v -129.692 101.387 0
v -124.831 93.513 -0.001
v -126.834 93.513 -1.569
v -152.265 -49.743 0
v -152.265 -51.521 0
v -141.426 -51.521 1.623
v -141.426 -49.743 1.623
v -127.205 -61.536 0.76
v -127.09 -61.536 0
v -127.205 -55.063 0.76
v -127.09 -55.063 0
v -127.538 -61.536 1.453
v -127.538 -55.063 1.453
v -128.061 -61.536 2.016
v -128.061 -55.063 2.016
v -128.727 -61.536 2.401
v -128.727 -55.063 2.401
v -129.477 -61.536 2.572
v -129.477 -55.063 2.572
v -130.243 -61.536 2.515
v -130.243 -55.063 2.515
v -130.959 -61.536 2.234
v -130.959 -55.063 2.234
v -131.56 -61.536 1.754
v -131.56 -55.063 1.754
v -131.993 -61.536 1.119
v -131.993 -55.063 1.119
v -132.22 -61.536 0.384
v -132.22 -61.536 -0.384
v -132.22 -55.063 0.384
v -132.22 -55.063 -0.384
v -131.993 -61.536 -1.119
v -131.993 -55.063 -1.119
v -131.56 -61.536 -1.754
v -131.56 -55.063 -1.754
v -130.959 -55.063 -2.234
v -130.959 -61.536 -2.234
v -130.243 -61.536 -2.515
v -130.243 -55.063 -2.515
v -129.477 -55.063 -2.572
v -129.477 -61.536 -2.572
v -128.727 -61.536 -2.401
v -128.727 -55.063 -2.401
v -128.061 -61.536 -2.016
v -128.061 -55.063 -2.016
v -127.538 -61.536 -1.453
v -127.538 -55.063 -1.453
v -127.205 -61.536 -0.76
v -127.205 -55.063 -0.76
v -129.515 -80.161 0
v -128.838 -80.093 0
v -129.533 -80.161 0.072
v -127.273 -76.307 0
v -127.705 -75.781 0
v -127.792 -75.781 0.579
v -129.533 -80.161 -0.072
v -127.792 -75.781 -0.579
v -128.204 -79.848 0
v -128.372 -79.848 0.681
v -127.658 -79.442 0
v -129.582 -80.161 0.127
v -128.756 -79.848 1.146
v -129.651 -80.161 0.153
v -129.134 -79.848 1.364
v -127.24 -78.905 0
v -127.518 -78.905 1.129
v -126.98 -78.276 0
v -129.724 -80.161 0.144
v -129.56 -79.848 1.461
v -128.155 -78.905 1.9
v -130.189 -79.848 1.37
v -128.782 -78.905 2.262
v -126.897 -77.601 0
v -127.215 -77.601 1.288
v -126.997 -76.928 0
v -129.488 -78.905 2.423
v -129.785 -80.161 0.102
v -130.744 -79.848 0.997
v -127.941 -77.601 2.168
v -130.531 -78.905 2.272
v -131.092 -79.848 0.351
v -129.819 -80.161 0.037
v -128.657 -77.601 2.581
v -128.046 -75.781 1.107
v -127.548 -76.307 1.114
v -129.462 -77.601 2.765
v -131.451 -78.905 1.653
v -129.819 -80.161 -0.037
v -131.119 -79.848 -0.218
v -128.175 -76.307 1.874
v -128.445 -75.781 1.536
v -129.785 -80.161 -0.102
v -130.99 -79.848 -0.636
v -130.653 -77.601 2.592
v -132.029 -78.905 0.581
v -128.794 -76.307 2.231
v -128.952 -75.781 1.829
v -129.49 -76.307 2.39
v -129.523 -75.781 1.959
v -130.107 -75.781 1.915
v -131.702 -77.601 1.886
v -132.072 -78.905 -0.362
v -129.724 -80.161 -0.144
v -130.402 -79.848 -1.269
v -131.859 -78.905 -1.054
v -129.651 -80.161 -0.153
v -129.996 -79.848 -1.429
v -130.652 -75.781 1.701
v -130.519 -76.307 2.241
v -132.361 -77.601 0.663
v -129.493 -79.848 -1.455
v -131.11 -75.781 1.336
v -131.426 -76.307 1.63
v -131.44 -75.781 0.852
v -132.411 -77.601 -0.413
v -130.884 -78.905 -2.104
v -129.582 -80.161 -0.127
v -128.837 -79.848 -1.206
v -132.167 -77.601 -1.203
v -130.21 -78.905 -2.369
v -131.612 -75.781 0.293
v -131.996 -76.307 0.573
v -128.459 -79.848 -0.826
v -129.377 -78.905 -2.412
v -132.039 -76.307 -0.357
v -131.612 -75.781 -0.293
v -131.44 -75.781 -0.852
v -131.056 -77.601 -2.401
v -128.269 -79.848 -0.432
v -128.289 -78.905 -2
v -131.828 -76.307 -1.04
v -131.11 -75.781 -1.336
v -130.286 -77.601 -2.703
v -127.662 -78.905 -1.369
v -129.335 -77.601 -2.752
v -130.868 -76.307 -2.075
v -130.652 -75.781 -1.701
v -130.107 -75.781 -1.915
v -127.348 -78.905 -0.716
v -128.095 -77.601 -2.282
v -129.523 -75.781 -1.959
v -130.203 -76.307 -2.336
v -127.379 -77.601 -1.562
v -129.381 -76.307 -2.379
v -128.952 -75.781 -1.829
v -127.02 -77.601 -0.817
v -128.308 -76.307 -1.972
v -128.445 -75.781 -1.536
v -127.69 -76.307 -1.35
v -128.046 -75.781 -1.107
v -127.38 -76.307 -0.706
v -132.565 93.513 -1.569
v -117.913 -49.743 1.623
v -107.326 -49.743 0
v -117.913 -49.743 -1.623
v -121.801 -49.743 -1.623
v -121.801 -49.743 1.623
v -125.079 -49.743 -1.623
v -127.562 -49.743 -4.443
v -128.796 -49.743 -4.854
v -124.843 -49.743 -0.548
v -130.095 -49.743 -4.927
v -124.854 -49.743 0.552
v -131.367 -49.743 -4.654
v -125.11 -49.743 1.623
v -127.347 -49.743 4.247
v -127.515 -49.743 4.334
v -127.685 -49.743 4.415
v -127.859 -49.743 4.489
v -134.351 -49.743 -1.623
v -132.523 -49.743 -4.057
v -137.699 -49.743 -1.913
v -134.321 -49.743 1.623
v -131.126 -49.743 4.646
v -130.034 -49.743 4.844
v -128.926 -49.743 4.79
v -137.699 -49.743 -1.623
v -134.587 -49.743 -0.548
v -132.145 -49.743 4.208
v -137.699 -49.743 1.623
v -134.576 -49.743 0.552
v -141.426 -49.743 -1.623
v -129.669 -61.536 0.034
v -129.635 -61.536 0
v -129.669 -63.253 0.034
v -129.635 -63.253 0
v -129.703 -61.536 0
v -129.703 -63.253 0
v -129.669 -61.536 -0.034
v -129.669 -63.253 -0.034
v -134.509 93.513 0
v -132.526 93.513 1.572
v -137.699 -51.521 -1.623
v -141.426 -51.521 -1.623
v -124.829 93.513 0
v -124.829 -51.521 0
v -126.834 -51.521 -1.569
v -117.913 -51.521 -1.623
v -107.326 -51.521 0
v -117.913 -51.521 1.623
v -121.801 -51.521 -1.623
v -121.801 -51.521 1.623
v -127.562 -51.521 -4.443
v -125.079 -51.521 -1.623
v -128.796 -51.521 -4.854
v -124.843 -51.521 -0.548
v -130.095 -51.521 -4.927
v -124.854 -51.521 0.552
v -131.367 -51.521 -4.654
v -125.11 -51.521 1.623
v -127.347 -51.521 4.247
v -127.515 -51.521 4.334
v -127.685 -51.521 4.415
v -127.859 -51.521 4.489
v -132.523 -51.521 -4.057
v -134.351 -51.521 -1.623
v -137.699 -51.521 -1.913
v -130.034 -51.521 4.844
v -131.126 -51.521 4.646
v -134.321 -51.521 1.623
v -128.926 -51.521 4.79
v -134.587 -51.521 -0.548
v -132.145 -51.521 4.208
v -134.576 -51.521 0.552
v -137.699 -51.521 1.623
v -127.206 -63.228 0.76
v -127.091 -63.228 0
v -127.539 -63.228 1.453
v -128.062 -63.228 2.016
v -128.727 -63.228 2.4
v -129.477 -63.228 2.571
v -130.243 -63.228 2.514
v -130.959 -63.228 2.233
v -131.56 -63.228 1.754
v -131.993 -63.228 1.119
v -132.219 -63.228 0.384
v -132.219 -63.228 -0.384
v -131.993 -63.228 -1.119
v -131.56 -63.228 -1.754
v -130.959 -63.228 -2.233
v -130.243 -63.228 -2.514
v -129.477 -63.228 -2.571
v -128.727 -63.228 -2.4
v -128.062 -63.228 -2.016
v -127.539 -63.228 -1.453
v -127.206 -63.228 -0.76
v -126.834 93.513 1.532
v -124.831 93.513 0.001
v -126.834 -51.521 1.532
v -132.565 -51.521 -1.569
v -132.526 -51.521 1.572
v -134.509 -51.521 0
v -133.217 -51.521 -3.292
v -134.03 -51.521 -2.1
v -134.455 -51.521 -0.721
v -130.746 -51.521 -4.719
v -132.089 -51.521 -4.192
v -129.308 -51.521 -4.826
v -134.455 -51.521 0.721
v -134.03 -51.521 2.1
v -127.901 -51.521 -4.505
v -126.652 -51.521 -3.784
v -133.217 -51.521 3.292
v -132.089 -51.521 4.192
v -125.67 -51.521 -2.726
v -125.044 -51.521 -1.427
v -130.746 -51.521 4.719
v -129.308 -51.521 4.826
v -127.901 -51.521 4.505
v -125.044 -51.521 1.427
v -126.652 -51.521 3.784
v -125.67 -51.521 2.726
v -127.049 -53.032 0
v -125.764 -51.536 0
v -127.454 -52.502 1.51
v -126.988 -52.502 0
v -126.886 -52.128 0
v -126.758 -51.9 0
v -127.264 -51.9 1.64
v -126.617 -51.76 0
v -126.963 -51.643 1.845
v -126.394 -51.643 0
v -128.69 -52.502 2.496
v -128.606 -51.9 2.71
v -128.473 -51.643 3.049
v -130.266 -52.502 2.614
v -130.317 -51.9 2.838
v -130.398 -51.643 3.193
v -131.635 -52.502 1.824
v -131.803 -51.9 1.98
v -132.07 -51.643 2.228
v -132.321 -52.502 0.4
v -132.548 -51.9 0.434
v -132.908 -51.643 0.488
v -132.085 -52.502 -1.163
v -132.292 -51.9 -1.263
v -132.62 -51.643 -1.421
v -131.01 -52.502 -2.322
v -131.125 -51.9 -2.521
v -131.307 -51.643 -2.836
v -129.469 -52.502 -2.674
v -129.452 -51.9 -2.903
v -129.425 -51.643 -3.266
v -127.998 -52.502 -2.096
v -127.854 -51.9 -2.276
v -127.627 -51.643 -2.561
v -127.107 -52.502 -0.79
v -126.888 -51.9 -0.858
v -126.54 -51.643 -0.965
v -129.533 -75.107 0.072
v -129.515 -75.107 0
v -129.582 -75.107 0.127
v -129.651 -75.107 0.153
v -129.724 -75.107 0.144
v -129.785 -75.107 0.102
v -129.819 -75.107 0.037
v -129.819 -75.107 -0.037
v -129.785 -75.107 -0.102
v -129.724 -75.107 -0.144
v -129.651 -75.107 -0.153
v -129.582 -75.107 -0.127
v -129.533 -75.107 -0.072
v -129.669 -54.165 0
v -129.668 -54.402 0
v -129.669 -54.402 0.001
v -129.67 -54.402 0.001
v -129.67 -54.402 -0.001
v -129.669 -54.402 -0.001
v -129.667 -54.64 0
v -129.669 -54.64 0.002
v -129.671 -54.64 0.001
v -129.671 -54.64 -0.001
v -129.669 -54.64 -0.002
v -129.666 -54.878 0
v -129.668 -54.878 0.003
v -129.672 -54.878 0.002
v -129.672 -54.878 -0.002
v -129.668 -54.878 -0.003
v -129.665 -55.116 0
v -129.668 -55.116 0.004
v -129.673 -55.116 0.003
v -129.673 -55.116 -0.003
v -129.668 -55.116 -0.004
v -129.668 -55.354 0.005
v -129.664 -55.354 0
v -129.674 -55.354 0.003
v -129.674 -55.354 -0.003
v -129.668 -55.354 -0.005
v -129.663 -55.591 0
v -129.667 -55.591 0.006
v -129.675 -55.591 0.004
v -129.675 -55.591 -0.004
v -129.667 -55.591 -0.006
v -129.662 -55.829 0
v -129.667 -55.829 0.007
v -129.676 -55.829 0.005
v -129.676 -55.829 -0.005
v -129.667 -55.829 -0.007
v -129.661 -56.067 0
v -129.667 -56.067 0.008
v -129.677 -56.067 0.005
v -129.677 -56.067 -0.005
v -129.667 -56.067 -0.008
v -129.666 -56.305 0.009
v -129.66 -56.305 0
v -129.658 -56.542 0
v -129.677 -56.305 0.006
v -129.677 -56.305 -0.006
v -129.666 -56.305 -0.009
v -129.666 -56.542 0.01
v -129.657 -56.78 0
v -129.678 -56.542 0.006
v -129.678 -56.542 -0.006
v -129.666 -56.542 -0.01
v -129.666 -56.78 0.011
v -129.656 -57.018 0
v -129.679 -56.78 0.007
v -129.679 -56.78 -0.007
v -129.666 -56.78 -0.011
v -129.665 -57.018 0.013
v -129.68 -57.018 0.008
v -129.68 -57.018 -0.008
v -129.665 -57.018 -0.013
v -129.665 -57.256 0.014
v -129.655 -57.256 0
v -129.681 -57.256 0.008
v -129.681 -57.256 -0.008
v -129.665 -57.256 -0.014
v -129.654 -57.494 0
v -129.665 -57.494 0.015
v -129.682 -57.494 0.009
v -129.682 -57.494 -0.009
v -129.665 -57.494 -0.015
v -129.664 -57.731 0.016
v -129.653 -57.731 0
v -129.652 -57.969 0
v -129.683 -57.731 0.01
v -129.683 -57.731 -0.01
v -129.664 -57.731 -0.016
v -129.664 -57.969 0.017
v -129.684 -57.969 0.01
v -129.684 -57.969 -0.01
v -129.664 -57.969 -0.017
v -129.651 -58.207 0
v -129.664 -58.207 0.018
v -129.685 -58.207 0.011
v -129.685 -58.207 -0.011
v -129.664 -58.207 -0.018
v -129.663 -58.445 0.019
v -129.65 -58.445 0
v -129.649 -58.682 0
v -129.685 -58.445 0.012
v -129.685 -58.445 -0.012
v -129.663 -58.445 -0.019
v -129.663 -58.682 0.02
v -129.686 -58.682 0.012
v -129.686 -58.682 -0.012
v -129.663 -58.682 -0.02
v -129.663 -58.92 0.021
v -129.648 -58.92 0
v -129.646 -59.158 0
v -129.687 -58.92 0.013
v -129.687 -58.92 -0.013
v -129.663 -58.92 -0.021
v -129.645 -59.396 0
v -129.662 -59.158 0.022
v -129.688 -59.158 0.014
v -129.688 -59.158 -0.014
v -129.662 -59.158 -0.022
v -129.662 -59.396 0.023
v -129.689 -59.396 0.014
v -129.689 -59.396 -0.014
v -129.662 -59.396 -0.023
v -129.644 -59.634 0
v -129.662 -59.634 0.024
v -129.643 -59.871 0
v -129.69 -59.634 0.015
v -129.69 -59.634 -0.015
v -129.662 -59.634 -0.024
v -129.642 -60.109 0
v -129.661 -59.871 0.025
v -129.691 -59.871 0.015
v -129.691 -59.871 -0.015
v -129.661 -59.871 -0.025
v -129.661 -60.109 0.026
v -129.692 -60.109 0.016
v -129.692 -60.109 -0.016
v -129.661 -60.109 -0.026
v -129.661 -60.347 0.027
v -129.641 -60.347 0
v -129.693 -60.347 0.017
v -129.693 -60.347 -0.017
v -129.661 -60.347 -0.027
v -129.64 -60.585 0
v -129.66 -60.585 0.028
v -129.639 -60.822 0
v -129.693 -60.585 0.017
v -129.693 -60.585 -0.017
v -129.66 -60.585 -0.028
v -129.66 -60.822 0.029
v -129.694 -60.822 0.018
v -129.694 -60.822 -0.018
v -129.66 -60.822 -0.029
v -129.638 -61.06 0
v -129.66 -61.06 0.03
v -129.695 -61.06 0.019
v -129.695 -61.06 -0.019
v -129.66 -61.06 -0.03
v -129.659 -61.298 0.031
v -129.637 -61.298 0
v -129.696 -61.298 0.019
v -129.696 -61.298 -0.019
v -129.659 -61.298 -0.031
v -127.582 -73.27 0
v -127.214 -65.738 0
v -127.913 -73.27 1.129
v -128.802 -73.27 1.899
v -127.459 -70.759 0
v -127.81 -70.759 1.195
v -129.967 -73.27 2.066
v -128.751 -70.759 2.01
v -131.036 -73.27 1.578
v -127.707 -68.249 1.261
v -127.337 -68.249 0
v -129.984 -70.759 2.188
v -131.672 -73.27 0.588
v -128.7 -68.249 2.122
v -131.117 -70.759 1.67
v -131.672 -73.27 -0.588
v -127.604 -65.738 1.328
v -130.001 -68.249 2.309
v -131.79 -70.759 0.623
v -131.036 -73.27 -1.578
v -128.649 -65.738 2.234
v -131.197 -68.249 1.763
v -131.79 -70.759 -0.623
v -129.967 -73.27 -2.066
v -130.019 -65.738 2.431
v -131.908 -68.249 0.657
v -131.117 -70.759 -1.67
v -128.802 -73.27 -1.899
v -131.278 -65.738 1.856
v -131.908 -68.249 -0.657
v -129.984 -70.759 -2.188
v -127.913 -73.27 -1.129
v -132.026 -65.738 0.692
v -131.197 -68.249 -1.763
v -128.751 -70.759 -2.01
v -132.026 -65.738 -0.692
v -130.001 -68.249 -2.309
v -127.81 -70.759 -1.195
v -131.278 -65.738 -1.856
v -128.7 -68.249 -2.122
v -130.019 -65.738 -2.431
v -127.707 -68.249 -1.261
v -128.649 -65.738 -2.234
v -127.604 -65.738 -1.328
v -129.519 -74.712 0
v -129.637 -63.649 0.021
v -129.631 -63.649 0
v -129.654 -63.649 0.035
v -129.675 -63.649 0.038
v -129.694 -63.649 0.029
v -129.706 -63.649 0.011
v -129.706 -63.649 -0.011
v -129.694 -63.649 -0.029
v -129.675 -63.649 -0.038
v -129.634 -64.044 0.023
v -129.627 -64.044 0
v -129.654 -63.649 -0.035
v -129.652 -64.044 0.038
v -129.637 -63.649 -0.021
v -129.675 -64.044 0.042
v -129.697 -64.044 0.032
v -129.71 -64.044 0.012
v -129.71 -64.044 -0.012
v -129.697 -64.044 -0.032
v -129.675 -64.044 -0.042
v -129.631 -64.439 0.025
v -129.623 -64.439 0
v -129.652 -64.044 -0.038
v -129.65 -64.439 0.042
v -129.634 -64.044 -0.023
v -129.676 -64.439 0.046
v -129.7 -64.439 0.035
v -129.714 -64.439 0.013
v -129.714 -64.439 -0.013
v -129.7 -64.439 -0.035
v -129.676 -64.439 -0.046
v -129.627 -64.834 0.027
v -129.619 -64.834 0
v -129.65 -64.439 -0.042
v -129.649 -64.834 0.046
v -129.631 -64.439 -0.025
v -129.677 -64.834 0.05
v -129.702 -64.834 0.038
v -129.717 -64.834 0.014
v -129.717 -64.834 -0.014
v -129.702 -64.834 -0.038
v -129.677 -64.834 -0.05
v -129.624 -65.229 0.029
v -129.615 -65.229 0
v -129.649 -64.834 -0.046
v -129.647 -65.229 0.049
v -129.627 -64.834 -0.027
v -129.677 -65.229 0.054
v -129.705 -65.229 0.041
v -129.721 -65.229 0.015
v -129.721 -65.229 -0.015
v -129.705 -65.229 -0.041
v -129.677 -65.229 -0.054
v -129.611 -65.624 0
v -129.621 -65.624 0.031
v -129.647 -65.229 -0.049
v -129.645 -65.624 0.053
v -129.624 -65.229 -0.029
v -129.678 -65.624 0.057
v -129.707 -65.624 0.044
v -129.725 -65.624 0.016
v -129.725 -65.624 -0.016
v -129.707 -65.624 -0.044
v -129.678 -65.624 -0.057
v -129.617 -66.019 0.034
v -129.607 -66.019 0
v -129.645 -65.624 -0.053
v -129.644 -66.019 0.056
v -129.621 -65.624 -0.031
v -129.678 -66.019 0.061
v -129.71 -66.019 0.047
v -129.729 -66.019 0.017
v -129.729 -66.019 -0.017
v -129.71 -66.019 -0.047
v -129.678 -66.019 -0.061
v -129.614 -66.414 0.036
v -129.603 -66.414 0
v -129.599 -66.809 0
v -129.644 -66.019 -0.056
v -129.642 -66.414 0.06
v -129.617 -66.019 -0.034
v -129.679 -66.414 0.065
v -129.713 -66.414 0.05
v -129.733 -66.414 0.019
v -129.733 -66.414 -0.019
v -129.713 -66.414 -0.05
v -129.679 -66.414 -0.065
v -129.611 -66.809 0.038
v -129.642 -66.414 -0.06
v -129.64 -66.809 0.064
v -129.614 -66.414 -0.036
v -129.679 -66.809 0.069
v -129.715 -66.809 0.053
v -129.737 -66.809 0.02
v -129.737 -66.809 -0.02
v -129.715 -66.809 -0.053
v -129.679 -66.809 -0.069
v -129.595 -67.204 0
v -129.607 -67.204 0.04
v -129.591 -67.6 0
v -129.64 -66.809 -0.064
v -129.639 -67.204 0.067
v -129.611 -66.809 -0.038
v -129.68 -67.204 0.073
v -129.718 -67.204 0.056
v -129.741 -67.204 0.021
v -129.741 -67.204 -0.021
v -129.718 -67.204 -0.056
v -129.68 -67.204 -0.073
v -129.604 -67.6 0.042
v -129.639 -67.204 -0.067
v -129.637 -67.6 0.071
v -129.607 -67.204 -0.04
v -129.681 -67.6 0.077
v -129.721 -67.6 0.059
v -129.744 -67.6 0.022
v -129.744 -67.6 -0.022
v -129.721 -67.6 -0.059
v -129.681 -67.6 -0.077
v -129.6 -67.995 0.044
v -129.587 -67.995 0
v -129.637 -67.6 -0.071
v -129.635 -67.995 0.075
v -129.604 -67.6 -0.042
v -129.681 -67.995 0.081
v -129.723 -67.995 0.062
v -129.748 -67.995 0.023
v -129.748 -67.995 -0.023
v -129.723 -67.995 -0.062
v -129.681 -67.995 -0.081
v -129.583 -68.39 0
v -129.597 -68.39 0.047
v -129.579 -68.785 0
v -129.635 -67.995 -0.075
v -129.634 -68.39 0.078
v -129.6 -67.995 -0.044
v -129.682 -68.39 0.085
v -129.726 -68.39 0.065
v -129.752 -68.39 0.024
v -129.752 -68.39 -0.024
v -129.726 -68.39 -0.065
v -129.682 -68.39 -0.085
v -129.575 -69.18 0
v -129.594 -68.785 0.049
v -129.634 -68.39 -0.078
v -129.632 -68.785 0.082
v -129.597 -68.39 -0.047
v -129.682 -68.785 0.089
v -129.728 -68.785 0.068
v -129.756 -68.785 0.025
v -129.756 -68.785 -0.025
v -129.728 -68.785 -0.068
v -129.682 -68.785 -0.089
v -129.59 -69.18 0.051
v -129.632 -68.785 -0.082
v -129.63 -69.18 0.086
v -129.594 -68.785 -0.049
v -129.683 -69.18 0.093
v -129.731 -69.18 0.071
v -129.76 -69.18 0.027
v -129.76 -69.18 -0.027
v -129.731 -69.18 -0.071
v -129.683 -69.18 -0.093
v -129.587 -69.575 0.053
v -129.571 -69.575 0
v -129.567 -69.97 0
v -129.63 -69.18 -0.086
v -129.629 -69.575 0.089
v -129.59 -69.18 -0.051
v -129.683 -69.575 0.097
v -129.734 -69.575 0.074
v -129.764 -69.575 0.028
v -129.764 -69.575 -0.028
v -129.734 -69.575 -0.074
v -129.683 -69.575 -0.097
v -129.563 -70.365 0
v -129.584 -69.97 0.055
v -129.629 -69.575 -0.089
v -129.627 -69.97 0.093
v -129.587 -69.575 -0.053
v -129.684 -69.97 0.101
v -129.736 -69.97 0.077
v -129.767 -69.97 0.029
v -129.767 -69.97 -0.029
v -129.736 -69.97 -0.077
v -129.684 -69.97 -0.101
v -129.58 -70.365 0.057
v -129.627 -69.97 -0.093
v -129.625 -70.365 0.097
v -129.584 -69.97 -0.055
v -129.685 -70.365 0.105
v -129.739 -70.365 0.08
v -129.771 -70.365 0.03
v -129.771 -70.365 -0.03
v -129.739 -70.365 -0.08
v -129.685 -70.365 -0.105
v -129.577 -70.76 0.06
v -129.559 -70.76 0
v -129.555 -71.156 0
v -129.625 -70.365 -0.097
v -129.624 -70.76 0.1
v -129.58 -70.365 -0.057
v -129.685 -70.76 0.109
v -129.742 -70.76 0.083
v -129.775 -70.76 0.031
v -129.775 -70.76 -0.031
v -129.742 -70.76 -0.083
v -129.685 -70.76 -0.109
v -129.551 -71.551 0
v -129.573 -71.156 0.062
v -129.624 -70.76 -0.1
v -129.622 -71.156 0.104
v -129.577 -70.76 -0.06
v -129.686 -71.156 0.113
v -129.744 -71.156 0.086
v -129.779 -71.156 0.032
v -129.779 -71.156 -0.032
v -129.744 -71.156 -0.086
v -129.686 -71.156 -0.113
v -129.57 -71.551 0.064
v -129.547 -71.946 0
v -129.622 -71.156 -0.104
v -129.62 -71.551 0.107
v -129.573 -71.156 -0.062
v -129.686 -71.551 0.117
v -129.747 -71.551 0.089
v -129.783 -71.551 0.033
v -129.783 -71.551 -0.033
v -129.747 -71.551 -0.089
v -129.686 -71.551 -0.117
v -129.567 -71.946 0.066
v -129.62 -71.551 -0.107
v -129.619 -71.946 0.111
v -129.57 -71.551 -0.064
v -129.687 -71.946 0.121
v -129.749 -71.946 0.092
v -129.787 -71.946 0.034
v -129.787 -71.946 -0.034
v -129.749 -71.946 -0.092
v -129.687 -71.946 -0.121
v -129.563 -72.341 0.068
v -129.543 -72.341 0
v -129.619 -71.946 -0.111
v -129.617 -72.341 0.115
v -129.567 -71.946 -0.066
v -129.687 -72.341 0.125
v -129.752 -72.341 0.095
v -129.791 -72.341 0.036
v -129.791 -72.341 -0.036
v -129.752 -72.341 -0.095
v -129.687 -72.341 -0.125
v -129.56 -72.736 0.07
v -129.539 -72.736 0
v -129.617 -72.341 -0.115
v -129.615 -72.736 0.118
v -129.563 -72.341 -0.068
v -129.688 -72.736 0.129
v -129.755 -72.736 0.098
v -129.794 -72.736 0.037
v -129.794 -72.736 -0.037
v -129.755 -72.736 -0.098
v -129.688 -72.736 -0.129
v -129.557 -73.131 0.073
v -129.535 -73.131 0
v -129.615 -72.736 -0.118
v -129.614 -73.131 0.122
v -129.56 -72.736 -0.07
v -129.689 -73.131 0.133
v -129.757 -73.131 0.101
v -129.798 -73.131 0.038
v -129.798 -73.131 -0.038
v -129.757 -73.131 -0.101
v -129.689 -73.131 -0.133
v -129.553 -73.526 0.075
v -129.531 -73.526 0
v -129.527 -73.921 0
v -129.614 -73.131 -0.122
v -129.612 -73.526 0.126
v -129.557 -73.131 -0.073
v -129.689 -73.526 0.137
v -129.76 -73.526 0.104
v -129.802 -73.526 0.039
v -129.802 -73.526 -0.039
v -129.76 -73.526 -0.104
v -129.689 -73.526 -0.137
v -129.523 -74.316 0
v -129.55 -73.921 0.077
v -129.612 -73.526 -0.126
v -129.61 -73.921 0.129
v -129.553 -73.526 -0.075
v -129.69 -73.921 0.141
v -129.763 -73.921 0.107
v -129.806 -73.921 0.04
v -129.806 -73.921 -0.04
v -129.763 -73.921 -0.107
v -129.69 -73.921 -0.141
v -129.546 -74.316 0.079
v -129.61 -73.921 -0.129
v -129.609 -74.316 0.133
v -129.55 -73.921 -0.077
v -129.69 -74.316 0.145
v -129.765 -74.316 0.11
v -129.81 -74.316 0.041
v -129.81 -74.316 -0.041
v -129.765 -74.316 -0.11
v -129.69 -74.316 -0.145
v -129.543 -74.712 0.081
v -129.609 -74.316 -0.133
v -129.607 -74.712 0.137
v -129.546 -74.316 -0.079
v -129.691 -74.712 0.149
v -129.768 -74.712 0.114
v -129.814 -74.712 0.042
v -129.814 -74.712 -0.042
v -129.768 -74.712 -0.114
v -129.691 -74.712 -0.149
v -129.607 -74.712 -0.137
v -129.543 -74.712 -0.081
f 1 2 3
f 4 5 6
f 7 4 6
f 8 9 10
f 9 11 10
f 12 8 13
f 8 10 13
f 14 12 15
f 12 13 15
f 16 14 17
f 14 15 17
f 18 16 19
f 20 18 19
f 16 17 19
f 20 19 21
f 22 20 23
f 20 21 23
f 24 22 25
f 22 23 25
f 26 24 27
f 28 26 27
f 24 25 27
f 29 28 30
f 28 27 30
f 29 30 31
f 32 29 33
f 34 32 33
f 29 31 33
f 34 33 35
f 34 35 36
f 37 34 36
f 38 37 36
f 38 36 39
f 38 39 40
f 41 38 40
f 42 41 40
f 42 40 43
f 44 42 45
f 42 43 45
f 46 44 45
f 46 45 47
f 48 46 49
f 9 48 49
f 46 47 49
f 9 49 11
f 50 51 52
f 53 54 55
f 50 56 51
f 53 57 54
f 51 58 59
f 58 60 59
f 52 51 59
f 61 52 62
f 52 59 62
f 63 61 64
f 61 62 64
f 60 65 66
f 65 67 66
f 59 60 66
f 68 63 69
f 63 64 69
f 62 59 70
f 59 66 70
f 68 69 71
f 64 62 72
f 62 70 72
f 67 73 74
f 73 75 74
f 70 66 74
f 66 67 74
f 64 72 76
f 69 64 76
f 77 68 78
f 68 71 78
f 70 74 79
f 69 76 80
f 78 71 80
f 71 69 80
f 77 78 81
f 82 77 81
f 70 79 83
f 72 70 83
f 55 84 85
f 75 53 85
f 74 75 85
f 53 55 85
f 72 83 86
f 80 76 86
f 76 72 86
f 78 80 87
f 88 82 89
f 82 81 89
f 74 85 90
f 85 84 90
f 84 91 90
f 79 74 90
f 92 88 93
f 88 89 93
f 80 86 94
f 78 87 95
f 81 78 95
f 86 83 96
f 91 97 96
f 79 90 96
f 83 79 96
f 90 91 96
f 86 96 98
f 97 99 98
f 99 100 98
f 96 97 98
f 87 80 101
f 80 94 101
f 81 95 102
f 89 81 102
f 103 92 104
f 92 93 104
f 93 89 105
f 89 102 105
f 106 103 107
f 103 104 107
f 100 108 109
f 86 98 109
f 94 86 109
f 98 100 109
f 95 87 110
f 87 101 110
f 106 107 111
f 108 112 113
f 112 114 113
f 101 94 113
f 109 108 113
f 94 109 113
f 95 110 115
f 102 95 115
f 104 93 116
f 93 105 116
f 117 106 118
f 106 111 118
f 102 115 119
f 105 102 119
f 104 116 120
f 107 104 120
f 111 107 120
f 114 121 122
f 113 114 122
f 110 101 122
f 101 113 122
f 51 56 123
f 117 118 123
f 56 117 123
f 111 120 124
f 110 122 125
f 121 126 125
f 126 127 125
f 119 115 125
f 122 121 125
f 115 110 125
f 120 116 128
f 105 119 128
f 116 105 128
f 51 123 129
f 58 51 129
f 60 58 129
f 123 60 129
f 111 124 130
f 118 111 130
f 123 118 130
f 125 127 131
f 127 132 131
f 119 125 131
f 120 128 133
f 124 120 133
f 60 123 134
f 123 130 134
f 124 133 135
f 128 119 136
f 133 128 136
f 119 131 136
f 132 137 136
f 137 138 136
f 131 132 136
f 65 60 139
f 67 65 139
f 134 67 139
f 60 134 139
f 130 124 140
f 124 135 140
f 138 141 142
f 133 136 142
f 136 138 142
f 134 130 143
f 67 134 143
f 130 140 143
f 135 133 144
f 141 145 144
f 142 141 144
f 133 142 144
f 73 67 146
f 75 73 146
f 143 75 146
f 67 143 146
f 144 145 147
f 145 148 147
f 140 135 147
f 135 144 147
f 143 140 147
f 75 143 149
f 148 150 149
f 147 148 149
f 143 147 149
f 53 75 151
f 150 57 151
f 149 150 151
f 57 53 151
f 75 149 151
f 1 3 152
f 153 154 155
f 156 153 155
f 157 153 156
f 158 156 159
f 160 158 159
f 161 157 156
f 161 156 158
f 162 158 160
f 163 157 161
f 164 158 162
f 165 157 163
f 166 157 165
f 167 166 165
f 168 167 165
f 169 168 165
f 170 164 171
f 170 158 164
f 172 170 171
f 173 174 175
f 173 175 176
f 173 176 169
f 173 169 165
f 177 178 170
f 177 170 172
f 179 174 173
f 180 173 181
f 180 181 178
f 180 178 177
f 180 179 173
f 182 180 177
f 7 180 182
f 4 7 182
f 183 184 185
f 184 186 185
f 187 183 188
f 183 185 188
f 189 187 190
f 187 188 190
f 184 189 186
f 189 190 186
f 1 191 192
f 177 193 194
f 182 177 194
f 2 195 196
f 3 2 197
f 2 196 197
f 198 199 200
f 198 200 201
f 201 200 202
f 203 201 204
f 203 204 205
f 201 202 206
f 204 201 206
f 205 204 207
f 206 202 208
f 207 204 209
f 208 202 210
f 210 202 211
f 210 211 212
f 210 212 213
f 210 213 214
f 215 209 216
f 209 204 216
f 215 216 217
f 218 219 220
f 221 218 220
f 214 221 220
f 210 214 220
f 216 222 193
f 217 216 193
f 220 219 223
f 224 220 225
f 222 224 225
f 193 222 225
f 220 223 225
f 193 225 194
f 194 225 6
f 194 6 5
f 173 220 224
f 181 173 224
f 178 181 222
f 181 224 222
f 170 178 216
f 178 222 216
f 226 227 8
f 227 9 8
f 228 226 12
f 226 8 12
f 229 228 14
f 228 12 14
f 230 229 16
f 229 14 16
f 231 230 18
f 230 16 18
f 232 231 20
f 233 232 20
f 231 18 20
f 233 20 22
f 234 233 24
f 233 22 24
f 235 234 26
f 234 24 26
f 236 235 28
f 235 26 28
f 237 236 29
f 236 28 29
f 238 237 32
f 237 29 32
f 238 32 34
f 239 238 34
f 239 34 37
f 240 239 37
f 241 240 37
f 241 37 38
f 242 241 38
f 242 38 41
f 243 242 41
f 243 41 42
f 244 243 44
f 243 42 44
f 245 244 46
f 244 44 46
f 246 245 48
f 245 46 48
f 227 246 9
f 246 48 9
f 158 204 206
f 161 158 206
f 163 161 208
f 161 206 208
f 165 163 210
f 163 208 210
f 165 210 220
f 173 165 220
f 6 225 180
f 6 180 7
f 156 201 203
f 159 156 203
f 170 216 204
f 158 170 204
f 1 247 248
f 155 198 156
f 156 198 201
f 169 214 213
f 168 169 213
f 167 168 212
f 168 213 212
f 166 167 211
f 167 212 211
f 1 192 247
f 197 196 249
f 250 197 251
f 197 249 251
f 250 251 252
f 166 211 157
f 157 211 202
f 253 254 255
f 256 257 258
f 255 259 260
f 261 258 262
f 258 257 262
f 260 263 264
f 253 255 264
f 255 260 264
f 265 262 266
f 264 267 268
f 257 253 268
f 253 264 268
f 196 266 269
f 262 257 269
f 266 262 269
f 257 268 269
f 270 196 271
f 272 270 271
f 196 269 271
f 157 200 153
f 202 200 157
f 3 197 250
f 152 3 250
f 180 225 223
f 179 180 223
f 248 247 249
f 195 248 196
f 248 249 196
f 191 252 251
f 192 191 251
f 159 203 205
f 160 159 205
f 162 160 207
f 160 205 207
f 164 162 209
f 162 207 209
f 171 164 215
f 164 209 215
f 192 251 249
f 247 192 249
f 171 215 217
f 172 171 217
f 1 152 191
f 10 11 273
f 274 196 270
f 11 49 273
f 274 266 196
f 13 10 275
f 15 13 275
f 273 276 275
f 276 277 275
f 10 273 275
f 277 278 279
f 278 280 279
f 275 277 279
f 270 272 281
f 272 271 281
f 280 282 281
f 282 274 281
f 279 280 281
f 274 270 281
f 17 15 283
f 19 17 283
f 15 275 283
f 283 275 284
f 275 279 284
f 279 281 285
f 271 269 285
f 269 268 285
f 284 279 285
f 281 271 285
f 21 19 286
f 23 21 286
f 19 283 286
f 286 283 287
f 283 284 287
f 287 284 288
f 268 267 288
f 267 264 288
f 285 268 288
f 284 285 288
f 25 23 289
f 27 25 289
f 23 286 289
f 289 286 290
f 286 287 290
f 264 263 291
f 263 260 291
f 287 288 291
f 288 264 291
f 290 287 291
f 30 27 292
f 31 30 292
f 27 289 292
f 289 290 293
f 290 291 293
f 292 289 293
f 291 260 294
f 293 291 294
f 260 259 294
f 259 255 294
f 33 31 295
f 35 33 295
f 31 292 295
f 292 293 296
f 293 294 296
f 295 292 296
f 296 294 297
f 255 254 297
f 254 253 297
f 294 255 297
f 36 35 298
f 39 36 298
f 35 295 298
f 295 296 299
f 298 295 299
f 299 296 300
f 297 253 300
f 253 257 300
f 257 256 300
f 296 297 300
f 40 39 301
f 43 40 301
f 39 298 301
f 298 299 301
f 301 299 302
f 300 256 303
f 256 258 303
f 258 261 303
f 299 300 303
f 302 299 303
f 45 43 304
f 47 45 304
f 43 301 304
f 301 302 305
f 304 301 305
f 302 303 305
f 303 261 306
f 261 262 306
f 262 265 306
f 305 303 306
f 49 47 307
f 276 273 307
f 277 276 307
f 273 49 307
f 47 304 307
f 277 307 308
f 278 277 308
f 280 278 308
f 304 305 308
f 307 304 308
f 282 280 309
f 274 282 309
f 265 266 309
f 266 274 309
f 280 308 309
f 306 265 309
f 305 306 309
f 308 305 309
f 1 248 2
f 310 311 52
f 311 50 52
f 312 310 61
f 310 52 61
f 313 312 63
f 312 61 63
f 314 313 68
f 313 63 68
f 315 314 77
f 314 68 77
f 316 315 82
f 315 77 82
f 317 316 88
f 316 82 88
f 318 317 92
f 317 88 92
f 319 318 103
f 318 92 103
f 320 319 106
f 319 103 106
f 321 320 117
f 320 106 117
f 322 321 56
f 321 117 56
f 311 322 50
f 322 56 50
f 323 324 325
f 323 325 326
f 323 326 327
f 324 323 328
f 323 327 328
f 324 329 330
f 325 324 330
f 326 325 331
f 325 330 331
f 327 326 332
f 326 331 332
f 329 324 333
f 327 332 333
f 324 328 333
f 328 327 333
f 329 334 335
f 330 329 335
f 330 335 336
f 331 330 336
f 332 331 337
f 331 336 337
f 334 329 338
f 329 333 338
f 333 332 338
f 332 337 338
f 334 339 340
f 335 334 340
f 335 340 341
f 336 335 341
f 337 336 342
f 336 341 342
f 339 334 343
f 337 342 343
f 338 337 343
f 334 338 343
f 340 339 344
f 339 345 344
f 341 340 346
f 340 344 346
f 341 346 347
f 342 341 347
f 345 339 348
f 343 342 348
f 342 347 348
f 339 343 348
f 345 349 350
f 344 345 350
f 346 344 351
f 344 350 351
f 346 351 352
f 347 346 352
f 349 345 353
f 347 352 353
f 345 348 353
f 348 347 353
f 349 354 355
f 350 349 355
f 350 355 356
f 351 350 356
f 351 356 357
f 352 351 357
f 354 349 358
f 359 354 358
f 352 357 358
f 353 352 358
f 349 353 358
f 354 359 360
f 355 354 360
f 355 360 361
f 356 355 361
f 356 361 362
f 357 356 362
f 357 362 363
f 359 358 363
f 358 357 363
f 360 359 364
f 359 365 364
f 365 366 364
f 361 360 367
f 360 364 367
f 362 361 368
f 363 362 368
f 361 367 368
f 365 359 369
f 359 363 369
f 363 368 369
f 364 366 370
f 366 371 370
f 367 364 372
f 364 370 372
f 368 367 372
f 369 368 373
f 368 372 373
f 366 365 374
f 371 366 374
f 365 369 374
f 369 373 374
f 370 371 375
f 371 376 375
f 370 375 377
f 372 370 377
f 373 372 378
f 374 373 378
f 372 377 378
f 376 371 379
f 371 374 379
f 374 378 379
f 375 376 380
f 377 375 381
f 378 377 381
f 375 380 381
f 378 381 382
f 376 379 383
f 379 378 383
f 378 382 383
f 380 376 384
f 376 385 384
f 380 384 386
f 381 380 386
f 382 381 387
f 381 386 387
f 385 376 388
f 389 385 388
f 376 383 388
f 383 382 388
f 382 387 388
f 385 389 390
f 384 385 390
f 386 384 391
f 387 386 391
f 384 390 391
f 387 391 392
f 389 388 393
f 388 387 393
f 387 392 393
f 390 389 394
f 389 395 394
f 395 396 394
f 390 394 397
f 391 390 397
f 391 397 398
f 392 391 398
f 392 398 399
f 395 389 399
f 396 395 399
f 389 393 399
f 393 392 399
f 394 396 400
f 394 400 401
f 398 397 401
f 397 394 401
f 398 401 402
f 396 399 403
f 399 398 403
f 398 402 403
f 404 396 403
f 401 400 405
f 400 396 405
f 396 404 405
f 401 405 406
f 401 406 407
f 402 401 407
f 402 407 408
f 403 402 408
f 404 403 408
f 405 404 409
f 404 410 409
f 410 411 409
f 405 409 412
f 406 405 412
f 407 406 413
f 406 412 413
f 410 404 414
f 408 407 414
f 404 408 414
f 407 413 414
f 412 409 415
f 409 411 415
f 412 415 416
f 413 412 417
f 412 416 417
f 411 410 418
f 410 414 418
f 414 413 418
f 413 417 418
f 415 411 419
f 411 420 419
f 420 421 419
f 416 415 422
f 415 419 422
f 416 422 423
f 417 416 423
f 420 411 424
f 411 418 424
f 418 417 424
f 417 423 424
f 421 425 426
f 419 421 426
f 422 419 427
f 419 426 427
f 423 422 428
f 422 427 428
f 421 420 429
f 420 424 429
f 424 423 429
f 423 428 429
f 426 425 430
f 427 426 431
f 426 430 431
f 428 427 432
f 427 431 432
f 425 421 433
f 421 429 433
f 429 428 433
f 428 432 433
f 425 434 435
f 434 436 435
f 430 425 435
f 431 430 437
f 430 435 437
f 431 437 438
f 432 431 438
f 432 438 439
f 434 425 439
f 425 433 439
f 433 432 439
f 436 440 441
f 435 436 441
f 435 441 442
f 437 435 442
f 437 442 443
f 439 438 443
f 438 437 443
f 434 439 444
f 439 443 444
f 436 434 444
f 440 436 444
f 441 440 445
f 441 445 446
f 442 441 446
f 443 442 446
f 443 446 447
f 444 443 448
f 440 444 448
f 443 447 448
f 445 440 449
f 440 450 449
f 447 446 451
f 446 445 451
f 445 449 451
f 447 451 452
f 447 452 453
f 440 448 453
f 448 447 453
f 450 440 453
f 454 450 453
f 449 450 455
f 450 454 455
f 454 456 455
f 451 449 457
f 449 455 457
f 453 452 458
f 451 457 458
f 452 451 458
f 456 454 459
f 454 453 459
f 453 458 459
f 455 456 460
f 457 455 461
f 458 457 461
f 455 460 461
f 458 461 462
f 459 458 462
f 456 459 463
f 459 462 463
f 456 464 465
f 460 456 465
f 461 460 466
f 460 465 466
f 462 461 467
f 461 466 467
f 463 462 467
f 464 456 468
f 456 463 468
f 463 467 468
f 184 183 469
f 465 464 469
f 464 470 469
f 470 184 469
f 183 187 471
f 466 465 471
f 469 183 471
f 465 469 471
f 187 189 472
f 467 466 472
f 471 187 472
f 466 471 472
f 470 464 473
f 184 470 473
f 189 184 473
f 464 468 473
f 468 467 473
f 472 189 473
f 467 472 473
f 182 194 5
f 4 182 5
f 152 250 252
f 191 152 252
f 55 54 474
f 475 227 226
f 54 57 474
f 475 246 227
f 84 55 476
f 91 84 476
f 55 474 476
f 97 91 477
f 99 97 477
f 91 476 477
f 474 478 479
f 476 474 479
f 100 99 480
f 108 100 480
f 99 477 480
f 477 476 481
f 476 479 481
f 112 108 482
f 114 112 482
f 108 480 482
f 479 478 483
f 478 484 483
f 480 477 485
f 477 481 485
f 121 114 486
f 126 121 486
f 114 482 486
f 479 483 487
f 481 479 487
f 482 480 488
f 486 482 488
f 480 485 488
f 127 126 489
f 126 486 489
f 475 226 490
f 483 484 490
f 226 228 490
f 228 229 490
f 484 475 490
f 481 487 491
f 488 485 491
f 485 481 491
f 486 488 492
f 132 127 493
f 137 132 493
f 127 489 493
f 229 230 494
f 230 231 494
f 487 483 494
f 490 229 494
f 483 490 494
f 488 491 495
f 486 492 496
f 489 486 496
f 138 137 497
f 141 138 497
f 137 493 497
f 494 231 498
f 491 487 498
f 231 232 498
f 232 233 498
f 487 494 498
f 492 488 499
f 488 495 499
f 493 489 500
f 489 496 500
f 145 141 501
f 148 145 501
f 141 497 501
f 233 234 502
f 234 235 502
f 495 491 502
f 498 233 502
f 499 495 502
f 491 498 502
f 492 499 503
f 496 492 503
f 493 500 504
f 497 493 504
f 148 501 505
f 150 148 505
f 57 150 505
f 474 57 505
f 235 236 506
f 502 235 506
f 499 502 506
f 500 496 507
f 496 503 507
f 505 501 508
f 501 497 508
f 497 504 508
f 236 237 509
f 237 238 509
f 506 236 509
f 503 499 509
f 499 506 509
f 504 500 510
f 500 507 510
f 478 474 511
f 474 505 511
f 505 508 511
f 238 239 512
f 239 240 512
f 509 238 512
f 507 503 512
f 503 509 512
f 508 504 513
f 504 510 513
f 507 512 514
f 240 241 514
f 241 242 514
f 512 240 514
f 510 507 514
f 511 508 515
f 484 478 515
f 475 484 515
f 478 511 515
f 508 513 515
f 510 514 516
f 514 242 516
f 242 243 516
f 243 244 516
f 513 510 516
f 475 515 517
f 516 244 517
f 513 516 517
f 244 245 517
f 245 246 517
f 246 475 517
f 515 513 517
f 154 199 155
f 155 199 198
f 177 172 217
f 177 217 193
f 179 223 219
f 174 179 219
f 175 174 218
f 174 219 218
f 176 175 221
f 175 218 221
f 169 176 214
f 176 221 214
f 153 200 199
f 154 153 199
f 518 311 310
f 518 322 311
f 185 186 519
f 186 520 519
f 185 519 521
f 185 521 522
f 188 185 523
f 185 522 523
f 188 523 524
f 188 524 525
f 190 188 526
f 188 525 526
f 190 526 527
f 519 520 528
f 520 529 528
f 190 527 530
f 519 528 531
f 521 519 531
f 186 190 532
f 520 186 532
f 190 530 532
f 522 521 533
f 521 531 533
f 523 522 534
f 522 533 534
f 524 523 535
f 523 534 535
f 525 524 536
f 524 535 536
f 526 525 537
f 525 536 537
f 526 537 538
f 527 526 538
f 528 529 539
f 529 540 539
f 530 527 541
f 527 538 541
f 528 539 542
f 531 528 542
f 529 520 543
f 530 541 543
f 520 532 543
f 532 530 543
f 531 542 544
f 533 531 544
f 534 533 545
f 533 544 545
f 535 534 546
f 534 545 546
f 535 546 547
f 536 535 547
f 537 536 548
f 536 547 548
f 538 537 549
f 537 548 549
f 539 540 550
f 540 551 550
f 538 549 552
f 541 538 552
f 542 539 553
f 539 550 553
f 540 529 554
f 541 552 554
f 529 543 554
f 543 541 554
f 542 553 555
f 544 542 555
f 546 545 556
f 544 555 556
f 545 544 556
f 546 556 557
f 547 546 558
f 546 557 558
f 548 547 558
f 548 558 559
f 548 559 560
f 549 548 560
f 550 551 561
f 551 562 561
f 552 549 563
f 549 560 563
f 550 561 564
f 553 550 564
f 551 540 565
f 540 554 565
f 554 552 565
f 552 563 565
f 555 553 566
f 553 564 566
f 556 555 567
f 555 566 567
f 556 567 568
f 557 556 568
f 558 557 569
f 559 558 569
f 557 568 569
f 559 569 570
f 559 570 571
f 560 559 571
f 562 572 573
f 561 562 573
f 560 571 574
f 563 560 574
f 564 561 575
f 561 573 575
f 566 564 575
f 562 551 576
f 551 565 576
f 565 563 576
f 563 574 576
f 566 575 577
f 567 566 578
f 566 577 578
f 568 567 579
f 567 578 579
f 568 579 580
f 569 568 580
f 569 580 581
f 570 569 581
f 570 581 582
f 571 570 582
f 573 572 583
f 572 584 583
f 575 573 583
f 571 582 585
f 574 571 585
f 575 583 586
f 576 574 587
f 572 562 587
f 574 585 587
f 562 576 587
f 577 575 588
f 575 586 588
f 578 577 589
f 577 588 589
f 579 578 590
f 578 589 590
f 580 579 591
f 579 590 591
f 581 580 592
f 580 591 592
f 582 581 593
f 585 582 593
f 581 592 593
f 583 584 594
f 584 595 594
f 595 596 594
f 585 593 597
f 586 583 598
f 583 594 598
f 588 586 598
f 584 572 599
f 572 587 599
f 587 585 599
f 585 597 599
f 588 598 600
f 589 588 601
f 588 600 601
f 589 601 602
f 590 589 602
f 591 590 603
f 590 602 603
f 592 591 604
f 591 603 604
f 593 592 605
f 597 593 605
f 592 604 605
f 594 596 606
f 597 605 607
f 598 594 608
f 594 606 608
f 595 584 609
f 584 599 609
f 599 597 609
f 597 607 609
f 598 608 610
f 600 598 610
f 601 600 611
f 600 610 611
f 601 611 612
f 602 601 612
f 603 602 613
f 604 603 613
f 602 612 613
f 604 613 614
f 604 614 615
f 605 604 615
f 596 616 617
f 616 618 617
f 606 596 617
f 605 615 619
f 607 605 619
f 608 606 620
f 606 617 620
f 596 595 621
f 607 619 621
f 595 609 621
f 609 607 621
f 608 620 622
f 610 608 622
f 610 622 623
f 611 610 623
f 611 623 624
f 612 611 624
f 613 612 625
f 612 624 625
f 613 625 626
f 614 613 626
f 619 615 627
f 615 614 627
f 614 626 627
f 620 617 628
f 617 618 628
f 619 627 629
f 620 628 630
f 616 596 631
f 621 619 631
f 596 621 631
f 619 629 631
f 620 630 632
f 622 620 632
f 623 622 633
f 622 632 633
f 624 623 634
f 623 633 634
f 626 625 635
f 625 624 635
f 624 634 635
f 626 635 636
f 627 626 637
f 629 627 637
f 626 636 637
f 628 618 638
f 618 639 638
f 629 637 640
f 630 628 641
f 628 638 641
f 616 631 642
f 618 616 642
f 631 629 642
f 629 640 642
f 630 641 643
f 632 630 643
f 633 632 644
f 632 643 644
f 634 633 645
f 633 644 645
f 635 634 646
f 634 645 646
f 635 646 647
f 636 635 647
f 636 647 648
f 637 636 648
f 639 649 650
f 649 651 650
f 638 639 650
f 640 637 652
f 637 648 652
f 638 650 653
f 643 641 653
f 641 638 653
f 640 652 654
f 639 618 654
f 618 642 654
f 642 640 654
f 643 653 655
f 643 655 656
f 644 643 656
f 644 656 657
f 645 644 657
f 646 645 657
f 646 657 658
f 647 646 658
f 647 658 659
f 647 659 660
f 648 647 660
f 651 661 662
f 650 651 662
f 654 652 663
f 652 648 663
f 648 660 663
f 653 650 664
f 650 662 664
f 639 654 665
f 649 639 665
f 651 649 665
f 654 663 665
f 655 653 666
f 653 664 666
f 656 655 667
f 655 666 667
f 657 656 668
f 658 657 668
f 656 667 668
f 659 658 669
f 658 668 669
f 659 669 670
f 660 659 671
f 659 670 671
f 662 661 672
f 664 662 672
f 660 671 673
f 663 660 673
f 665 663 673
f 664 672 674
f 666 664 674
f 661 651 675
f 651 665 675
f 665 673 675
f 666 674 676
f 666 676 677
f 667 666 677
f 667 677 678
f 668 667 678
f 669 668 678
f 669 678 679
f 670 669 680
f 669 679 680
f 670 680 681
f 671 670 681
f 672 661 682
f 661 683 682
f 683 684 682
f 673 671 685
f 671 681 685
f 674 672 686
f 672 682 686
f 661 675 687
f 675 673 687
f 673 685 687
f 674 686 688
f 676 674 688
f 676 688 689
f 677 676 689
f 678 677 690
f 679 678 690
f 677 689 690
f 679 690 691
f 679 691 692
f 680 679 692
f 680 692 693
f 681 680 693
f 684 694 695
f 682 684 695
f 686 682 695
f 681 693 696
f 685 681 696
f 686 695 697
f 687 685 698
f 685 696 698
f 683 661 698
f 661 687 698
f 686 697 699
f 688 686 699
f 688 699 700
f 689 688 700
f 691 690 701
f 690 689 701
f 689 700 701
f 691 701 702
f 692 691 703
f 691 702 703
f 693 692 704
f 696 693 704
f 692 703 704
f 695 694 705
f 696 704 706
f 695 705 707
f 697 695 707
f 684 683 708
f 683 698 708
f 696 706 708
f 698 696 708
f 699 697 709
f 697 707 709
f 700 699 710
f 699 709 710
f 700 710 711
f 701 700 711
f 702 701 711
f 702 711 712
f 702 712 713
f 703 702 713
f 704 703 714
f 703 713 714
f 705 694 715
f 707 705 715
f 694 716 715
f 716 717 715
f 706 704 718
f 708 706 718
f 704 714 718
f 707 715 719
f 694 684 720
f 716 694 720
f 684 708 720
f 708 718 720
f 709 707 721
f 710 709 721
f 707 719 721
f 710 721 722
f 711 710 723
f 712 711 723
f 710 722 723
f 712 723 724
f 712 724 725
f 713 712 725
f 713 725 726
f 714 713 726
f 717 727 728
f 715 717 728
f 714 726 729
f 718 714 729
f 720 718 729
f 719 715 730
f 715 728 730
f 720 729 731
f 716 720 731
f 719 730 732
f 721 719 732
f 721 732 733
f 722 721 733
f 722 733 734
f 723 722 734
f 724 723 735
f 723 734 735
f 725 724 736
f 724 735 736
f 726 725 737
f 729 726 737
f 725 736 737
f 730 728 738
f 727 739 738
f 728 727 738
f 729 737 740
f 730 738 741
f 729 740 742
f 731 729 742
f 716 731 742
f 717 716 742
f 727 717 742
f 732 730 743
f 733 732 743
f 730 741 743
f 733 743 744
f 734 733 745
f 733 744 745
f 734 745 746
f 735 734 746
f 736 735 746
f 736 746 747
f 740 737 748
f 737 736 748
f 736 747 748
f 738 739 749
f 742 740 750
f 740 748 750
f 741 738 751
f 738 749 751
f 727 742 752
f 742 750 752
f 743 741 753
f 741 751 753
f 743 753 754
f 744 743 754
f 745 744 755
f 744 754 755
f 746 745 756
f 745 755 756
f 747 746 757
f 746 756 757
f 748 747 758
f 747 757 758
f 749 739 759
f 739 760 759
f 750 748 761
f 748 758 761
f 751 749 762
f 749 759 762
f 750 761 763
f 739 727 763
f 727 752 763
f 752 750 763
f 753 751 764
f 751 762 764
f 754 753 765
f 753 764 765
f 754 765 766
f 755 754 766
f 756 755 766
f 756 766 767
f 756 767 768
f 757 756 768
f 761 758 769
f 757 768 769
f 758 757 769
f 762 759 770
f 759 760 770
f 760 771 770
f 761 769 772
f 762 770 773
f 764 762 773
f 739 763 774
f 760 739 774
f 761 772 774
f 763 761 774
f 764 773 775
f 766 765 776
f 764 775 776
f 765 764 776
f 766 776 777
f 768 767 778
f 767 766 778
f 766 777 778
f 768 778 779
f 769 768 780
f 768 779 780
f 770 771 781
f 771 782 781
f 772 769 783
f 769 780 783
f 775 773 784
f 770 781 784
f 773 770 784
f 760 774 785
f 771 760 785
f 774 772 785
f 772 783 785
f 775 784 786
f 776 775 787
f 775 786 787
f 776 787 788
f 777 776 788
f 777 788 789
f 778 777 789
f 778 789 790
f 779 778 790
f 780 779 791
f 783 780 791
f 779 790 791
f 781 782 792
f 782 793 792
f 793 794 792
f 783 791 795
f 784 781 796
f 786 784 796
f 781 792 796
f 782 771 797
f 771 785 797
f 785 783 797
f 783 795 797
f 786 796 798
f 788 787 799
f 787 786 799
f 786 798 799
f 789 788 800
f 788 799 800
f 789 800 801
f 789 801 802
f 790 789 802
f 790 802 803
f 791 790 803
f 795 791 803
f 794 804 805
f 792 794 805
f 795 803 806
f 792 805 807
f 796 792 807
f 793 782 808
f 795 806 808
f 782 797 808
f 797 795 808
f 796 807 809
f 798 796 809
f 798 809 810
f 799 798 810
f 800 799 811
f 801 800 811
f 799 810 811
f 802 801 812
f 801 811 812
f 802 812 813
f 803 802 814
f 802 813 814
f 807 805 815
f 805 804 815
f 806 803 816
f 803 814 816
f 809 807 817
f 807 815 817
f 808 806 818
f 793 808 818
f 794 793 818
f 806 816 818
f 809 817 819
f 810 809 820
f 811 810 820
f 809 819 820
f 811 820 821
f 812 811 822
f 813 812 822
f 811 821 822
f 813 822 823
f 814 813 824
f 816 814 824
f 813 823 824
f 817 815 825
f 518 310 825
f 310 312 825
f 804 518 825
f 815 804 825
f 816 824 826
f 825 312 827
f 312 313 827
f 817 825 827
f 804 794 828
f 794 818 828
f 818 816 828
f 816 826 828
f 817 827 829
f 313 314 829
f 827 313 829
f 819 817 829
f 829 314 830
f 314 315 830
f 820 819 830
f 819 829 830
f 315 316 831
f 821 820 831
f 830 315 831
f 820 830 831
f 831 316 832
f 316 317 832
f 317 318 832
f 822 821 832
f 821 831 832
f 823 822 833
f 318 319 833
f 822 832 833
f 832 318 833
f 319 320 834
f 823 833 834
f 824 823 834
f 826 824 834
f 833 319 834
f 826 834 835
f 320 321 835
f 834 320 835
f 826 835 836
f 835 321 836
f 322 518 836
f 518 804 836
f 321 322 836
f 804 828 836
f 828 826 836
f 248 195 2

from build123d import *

# Parameters (mm, degrees)
F2_W     = 3.7265494466
F2_H     = 3.2452103915
F2_W_2   = 3.8878694177
F3_DEPTH = 1.778
F5_DEPTH = 145.034


with BuildPart() as f1:
    # F0 (on Top) → F1 (revolve)
    with BuildSketch(Plane.XY):
        with BuildLine():
            Line((-127.0902585749, -61.5358054638), (-127.0902585749, -55.0634515109))
            add(Edge.make_bspline(
                [(-129.669457674, -54.1646741331), (-128.2850205898, -54.2526878417), (-127.9523950581, -54.2903457406), (-127.0902585749, -55.0634515109)],
                knots=[0, 0, 0, 0, 2.7313126456, 2.7313126456, 2.7313126456, 2.7313126456], degree=3))
            Line((-129.669457674, -54.1646741331), (-129.635438323, -61.5358054638))
            Line((-129.635438323, -61.5358054638), (-127.0902585749, -61.5358054638))
        make_face()
        with BuildLine():
            add(Edge.make_bspline(
                [(-129.669457674, -54.1646741331), (-128.2850205898, -54.2526878417), (-127.9523950581, -54.2903457406), (-127.0902585749, -55.0634515109)],
                knots=[0, 0, 0, 0, 2.7313126456, 2.7313126456, 2.7313126456, 2.7313126456], degree=3))
            add(Edge.make_bspline(
                [(-127.0902585749, -55.0634515109), (-127.0711956695, -51.5209063888), (-127.0976996838, -51.5209063888), (-124.8294711113, -51.5209063888)],
                knots=[0, 0, 0, 0, 4.2024737832, 4.2024737832, 4.2024737832, 4.2024737832], degree=3))
            Line((-124.8294711113, -51.5209063888), (-129.669457674, -51.5209063888))
            Line((-129.669457674, -51.5209063888), (-129.669457674, -54.1646741331))
        make_face()
        Polygon((-127.0909756422, -63.2276013494), (-127.0902585749, -61.5358054638), (-129.635438323, -61.5358054638), (-129.635438323, -63.25340271), align=None)
        with BuildLine():
            Line((-127.7048313232, -75.7807434323), (-127.0909756422, -63.2276013494))
            Line((-127.0909756422, -63.2276013494), (-129.635438323, -63.25340271))
            Line((-129.635438323, -63.25340271), (-129.5152439055, -75.1066617071))
            ThreePointArc((-129.5152439055, -75.1066617071), (-128.5431259435, -75.263994789), (-127.7048313232, -75.7807434323))
        make_face()
        with BuildLine():
            ThreePointArc((-129.5152439055, -80.1606514156), (-127.0886064754, -78.5995732103), (-127.7048313232, -75.7807434323))
            ThreePointArc((-127.7048313232, -75.7807434323), (-128.5431259435, -75.263994789), (-129.5152439055, -75.1066617071))
            Line((-129.5152439055, -75.1066617071), (-129.5152439055, -80.1606514156))
        make_face()
    revolve(axis=Axis((-129.669457674, -52.8427902609, 0), (0, -1, 0)))


with BuildPart() as f3:
    # F2 (on face) → F3 (new body)
    with BuildSketch(Plane(origin=(0, -51.5209063888, 0), x_dir=(-1, 0, 0), z_dir=(0, 1, 0))):
        with Locations((139.5624317229, 0)):
            Rectangle(F2_W, F2_H)
        Polygon((152.2654891014, 0), (141.4257064462, 1.6226051957), (141.4257064462, -1.6226051957), align=None)
        with BuildLine():
            Line((137.6991569996, -1.6226051957), (137.6991569996, 1.6226051957))
            Line((137.6991569996, 1.6226051957), (134.3205327463, 1.6226051957))
            ThreePointArc((134.3205327463, 1.6226051957), (134.6124994318, 0.0026180172), (134.3512476145, -1.6226051957))
            Line((134.3512476145, -1.6226051957), (137.6991569996, -1.6226051957))
        make_face()
        with BuildLine():
            Line((134.3205327463, 1.6226051957), (137.6991569996, 1.6226051957))
            Line((137.6991569996, 1.6226051957), (132.1454062558, 4.2083863288))
            ThreePointArc((132.1454062558, 4.2083863288), (133.4630258653, 3.1090162755), (134.3205327463, 1.6226051957))
        make_face()
        with BuildLine():
            Line((125.1095648786, 1.6226051957), (134.3205327463, 1.6226051957))
            ThreePointArc((134.3205327463, 1.6226051957), (133.4630258653, 3.1090162755), (132.1454062558, 4.2083863288))
            ThreePointArc((132.1454062558, 4.2083863288), (130.034461551, 4.8435084859), (127.8588082619, 4.4885430413))
            Line((127.8588082619, 4.4885430413), (127.3474626864, 4.2466232709))
            ThreePointArc((127.3474626864, 4.2466232709), (125.9868685604, 3.1407017286), (125.1095648786, 1.6226051957))
        make_face()
        with BuildLine():
            Line((137.6991569996, -1.9126803963), (137.6991569996, -1.6226051957))
            Line((137.6991569996, -1.6226051957), (134.3512476145, -1.6226051957))
            ThreePointArc((134.3512476145, -1.6226051957), (133.6309256802, -2.9853464903), (132.5227364323, -4.0567213621))
            Line((132.5227364323, -4.0567213621), (137.6991569996, -1.9126803963))
        make_face()
        with BuildLine():
            ThreePointArc((125.0788500104, -1.6226051957), (124.8175981931, 0.0026180172), (125.1095648786, 1.6226051957))
            Line((125.1095648786, 1.6226051957), (121.8010783195, 1.6226051957))
            Line((121.8010783195, 1.6226051957), (121.8010783195, -1.6226051957))
            Line((121.8010783195, -1.6226051957), (125.0788500104, -1.6226051957))
        make_face()
        with BuildLine():
            Line((121.8010783195, 1.6226051957), (125.1095648786, 1.6226051957))
            ThreePointArc((125.1095648786, 1.6226051957), (125.9868685604, 3.1407017286), (127.3474626864, 4.2466232709))
            Line((127.3474626864, 4.2466232709), (121.8010783195, 1.6226051957))
        make_face()
        with BuildLine():
            ThreePointArc((132.5227364323, -4.0567213621), (133.6309256802, -2.9853464903), (134.3512476145, -1.6226051957))
            Line((134.3512476145, -1.6226051957), (125.0788500104, -1.6226051957))
            ThreePointArc((125.0788500104, -1.6226051957), (126.0390793221, -3.2801555498), (127.5616517136, -4.442604181))
            ThreePointArc((127.5616517136, -4.442604181), (130.0948519311, -4.9266561038), (132.5227364323, -4.0567213621))
        make_face()
        with BuildLine():
            Line((127.3474626864, 4.2466232709), (127.8588082619, 4.4885430413))
            ThreePointArc((127.8588082619, 4.4885430413), (127.5995980828, 4.3750601367), (127.3474626864, 4.2466232709))
        make_face()
        with Locations((119.8571436107, 0)):
            Rectangle(F2_W_2, F2_H)
        with BuildLine():
            ThreePointArc((127.5616517136, -4.442604181), (126.0390793221, -3.2801555498), (125.0788500104, -1.6226051957))
            Line((125.0788500104, -1.6226051957), (121.8010783195, -1.6226051957))
            Line((121.8010783195, -1.6226051957), (127.5616517136, -4.442604181))
        make_face()
        Polygon((117.9132089019, -1.6226051957), (117.9132089019, 1.6226051957), (107.3257997632, 0), align=None)
    extrude(amount=F3_DEPTH)


with BuildPart() as f5:
    # F4 (on face) → F5 (new body)
    with BuildSketch(Plane(origin=(0, -51.5209063888, 0), x_dir=(-1, 0, 0), z_dir=(0, 1, 0))):
        Polygon((126.8343776464, 1.5322518302), (124.8294711113, 0), (126.8343776464, -1.5685113613), (132.5649023056, -1.5685113613), (134.5094442368, 0), (132.525652647, 1.5715019545), align=None)
    extrude(amount=F5_DEPTH)

    # F6 (on face) → F9 section 0
    with BuildSketch(Plane(origin=(0, 93.5130936112, 0), x_dir=(-1, 0, 0), z_dir=(0, 1, 0)), mode=Mode.PRIVATE) as f9_s0:
        Polygon((126.8343776464, 1.5322518302), (124.831040289, 0.0011992456), (124.831040289, -0.0012276248), (126.8343776464, -1.5685113613), (132.5649023056, -1.5685113613), (134.5094442368, 0), (132.525652647, 1.5715019545), align=None)
    loft([f9_s0.sketch, Vertex(-129.6916604042, 101.3870936112, 0)])


solid = Compound([f1.part, f3.part, f5.part])
